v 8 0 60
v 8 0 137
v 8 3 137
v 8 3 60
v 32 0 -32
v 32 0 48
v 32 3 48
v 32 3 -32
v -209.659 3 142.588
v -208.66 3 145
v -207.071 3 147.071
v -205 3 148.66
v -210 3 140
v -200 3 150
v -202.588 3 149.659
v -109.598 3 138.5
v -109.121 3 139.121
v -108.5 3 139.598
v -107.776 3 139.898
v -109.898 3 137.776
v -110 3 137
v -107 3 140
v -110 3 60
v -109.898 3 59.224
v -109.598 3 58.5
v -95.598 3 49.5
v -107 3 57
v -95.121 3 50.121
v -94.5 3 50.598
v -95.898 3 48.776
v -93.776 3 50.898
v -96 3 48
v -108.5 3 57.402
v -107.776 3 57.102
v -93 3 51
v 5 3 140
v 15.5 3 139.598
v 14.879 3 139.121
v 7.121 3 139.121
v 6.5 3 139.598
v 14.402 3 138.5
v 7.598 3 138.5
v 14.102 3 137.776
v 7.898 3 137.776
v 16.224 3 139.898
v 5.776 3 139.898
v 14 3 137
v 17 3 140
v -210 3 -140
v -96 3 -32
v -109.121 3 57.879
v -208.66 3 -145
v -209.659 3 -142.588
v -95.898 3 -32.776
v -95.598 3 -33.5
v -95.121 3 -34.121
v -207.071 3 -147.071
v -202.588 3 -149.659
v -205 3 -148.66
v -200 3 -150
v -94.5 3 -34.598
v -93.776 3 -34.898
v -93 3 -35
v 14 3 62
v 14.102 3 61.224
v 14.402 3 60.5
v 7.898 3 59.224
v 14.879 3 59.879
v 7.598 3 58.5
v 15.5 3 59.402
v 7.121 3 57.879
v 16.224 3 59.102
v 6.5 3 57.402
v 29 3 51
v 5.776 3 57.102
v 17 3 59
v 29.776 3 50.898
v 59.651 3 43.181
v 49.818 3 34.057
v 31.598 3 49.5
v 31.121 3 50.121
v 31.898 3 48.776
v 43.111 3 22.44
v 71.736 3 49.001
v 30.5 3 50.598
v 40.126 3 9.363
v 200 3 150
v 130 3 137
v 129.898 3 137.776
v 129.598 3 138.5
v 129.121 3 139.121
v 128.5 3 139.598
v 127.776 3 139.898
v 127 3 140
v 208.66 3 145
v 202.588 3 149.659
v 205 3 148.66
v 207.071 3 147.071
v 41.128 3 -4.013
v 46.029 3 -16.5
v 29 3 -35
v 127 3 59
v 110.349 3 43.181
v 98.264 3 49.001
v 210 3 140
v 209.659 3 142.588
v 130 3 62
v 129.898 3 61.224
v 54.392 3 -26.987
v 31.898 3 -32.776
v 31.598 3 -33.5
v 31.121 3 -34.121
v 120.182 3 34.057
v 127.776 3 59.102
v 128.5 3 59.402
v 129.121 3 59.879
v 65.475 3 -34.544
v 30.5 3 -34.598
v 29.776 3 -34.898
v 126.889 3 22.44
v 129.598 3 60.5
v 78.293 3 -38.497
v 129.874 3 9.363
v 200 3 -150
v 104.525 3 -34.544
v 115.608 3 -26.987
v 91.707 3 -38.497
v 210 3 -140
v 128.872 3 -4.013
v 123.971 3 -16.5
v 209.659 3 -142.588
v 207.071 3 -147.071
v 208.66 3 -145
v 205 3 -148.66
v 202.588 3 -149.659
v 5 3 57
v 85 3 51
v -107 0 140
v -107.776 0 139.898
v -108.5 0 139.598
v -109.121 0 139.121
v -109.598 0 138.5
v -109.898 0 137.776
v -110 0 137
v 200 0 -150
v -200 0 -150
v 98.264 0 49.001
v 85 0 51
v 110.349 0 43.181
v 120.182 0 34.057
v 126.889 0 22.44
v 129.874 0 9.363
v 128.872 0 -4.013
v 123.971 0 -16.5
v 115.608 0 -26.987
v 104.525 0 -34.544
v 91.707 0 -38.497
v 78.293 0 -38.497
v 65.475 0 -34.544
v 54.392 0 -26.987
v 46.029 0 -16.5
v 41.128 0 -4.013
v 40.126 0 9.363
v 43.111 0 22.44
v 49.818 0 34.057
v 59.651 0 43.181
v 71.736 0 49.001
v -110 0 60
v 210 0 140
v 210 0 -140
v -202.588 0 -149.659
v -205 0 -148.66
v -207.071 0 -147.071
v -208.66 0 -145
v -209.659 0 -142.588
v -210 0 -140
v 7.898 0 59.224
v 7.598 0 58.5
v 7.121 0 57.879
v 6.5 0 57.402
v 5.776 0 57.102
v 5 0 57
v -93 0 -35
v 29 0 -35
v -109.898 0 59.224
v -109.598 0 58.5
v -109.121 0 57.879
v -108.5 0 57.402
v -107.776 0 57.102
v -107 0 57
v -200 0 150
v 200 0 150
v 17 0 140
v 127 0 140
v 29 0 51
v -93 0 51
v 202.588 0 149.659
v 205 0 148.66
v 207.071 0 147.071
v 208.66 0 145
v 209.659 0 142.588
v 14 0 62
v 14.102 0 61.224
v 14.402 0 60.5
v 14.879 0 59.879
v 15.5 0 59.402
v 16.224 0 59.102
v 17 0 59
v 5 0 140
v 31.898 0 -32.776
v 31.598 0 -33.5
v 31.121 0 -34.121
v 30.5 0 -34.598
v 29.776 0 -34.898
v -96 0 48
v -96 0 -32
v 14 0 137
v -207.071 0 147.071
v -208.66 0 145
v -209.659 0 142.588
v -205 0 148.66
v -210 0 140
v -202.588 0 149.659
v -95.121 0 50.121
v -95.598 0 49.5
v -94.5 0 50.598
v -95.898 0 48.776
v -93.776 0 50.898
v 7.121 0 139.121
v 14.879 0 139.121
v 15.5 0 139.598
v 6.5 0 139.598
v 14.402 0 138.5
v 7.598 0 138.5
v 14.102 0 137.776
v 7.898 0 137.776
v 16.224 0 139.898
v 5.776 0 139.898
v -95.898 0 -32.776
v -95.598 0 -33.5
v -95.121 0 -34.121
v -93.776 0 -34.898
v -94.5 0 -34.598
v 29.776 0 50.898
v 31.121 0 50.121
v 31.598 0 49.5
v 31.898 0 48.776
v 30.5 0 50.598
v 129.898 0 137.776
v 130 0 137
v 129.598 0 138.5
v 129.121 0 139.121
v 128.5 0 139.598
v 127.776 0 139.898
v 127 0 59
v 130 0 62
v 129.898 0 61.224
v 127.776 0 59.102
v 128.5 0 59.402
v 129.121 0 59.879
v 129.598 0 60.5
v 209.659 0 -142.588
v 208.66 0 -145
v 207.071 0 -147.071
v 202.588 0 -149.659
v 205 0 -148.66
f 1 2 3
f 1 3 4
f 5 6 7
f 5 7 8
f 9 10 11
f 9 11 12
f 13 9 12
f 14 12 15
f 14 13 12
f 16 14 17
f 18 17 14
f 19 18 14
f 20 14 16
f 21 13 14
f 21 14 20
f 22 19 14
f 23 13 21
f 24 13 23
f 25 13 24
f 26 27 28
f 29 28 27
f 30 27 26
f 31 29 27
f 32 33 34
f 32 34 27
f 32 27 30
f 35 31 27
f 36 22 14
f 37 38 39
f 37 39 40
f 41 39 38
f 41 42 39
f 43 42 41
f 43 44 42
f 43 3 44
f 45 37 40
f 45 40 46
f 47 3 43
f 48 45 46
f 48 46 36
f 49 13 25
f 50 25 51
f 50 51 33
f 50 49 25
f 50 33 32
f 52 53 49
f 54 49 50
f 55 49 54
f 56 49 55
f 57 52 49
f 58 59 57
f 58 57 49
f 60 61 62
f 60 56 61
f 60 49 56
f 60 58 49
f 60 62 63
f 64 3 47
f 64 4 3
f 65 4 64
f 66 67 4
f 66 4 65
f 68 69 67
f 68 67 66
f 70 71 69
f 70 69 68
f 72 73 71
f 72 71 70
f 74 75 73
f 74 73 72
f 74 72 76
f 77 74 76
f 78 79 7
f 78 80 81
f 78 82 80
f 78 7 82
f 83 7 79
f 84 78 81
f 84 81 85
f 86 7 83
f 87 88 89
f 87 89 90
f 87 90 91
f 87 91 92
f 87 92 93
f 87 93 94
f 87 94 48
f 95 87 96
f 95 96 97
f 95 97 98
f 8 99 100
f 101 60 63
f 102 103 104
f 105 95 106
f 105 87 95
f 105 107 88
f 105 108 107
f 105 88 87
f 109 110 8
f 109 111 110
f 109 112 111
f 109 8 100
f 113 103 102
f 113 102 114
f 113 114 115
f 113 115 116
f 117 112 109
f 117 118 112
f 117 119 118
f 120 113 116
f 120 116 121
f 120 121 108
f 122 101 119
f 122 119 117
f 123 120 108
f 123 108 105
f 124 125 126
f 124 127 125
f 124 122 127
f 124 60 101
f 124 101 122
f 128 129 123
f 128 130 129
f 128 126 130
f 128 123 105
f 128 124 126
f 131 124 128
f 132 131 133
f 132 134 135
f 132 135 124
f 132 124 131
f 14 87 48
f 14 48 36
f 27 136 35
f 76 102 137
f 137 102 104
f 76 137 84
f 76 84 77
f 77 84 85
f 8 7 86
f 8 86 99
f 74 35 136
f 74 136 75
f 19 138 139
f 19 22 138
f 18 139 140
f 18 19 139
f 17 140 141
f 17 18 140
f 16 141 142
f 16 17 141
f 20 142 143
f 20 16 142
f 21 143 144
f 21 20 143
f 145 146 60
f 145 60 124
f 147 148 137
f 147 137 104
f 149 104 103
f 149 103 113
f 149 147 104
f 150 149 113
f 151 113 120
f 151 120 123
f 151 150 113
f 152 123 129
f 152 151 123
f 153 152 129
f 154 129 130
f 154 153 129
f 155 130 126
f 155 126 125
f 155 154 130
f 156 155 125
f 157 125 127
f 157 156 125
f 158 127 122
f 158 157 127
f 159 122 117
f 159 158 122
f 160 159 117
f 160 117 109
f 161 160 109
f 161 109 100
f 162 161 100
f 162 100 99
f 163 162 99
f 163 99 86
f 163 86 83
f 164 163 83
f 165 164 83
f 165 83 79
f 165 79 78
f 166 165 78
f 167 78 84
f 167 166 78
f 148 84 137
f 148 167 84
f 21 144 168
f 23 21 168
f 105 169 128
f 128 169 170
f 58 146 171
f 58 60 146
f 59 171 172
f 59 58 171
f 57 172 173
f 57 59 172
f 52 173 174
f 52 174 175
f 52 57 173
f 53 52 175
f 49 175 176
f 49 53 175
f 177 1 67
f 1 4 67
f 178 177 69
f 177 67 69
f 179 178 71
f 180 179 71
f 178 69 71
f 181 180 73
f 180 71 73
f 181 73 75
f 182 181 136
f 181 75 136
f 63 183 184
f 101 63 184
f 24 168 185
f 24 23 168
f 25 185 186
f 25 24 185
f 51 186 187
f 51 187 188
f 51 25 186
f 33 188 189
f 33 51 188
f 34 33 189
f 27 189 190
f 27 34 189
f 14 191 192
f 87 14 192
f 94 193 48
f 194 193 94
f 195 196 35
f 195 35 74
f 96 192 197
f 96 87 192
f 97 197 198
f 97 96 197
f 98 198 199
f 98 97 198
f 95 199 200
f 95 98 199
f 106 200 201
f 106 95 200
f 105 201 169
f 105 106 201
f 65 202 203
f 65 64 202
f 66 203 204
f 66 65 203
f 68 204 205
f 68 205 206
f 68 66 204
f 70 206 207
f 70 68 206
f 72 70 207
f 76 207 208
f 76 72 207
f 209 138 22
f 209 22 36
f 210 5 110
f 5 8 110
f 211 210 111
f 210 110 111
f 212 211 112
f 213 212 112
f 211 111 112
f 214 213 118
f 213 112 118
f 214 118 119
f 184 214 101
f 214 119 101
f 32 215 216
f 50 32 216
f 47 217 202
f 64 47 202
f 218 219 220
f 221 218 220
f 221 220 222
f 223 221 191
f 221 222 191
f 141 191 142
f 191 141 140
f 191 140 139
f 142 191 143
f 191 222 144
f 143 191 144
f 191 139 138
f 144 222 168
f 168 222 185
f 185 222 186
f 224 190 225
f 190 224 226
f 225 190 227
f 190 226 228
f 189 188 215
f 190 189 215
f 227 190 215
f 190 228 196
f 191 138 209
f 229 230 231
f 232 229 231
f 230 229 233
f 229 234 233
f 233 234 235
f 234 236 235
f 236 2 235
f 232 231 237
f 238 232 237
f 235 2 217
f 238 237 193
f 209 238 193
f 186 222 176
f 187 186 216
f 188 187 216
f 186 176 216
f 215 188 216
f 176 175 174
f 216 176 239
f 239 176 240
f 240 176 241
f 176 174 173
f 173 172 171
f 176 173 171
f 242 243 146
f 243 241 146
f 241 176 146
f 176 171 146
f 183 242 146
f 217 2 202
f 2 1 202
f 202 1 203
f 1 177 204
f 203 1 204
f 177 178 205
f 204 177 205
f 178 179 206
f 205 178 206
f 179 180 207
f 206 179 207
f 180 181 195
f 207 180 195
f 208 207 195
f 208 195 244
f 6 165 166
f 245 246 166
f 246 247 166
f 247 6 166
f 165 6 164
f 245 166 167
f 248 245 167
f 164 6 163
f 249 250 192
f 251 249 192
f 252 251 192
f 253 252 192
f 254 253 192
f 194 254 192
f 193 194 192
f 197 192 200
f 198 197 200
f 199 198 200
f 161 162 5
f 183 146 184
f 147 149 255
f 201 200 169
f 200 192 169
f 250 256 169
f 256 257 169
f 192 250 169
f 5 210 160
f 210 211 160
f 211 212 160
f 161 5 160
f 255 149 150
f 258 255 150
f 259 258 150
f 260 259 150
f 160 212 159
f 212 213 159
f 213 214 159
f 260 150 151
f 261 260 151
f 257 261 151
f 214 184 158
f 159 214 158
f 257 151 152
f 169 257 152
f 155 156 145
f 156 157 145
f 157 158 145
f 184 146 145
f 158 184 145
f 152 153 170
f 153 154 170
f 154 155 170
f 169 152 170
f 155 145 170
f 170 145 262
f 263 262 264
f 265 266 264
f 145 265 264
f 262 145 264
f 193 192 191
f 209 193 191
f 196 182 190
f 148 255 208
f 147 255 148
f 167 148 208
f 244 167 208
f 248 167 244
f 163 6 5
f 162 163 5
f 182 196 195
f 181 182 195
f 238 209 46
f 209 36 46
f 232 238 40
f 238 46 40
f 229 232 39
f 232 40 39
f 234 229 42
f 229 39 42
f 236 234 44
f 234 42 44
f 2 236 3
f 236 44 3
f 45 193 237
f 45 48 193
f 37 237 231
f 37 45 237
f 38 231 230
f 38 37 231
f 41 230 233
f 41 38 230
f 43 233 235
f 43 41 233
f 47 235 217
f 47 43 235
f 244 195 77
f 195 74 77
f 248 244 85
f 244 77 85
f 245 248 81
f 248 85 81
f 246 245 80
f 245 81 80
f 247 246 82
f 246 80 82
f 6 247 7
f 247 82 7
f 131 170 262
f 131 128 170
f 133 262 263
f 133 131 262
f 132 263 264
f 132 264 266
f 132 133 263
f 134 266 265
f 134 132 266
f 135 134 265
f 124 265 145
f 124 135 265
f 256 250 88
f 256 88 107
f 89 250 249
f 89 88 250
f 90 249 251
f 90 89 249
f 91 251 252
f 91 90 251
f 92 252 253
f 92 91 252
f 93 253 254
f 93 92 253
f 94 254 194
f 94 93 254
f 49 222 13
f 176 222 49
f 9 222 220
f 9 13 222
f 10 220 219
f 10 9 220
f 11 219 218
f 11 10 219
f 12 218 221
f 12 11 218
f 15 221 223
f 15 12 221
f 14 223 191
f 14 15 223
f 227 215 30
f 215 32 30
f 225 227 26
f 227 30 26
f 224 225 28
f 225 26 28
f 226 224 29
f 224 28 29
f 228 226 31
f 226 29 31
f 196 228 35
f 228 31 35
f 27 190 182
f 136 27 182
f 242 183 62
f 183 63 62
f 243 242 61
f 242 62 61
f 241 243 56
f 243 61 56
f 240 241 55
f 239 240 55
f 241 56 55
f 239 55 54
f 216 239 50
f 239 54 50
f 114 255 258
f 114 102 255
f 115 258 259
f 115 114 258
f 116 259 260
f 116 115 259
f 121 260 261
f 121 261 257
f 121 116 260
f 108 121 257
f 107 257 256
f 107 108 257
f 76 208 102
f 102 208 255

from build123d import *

# Parameters (mm, degrees)
SKETCH_2_W      = 420
SKETCH_2_H      = 300
SKETCH_2_R      = 45
SKETCH_2_W_2    = 116
SKETCH_2_H_2    = 81
SKETCH_2_W_3    = 118
SKETCH_2_H_3    = 83
SKETCH_2_W_4    = 128
SKETCH_2_H_4    = 86
EXTRUDE_2_DEPTH = 3
FILLET_1_R      = 3
FILLET_2_R      = 3
FILLET_3_R      = 3
FILLET_4_R      = 3
FILLET_5_R      = 3
FILLET_6_R      = 3
FILLET_7_R      = 3
FILLET_8_R      = 3
FILLET_9_R      = 3
FILLET_10_R     = 3
FILLET_11_R     = 3
FILLET_12_R     = 3
FILLET_13_R     = 10
FILLET_14_R     = 10
FILLET_15_R     = 10
FILLET_16_R     = 10


with BuildPart() as part:
    # 草图2 → 凸台-拉伸2 (new body)
    with BuildSketch(Plane(origin=(0, 0, 0), x_dir=(1, 0, 0), z_dir=(0, 1, 0))):
        Rectangle(SKETCH_2_W, SKETCH_2_H)
        with Locations(Location((85, -6, 0), (0, 0, 270))):
            Circle(SKETCH_2_R, mode=Mode.SUBTRACT)
        with Locations((72, -99.5)):
            Rectangle(SKETCH_2_W_2, SKETCH_2_H_2, mode=Mode.SUBTRACT)
        with Locations((-51, -98.5)):
            Rectangle(SKETCH_2_W_3, SKETCH_2_H_3, mode=Mode.SUBTRACT)
        with Locations((-32, -8)):
            Rectangle(SKETCH_2_W_4, SKETCH_2_H_4, mode=Mode.SUBTRACT)
    extrude(amount=EXTRUDE_2_DEPTH)

    # 圆角1
    fillet_1_edges = [part.edges().sort_by_distance(p)[0] for p in [
        (-96, 1.5, -35),
    ]]
    fillet(fillet_1_edges, radius=FILLET_1_R)

    # 圆角2
    fillet_2_edges = [part.edges().sort_by_distance(p)[0] for p in [
        (-96, 1.5, 51),
    ]]
    fillet(fillet_2_edges, radius=FILLET_2_R)

    # 圆角3
    fillet_3_edges = [part.edges().sort_by_distance(p)[0] for p in [
        (32, 1.5, 51),
    ]]
    fillet(fillet_3_edges, radius=FILLET_3_R)

    # 圆角4
    fillet_4_edges = [part.edges().sort_by_distance(p)[0] for p in [
        (32, 1.5, -35),
    ]]
    fillet(fillet_4_edges, radius=FILLET_4_R)

    # 圆角5
    fillet_5_edges = [part.edges().sort_by_distance(p)[0] for p in [
        (14, 1.5, 140),
    ]]
    fillet(fillet_5_edges, radius=FILLET_5_R)

    # 圆角6
    fillet_6_edges = [part.edges().sort_by_distance(p)[0] for p in [
        (14, 1.5, 59),
    ]]
    fillet(fillet_6_edges, radius=FILLET_6_R)

    # 圆角7
    fillet_7_edges = [part.edges().sort_by_distance(p)[0] for p in [
        (130, 1.5, 59),
    ]]
    fillet(fillet_7_edges, radius=FILLET_7_R)

    # 圆角8
    fillet_8_edges = [part.edges().sort_by_distance(p)[0] for p in [
        (130, 1.5, 140),
    ]]
    fillet(fillet_8_edges, radius=FILLET_8_R)

    # 圆角9
    fillet_9_edges = [part.edges().sort_by_distance(p)[0] for p in [
        (8, 1.5, 140),
    ]]
    fillet(fillet_9_edges, radius=FILLET_9_R)

    # 圆角10
    fillet_10_edges = [part.edges().sort_by_distance(p)[0] for p in [
        (8, 1.5, 57),
    ]]
    fillet(fillet_10_edges, radius=FILLET_10_R)

    # 圆角11
    fillet_11_edges = [part.edges().sort_by_distance(p)[0] for p in [
        (-110, 1.5, 140),
    ]]
    fillet(fillet_11_edges, radius=FILLET_11_R)

    # 圆角12
    fillet_12_edges = [part.edges().sort_by_distance(p)[0] for p in [
        (-110, 1.5, 57),
    ]]
    fillet(fillet_12_edges, radius=FILLET_12_R)

    # 圆角13
    fillet_13_edges = [part.edges().sort_by_distance(p)[0] for p in [
        (-210, 1.5, 150),
    ]]
    fillet(fillet_13_edges, radius=FILLET_13_R)

    # 圆角14
    fillet_14_edges = [part.edges().sort_by_distance(p)[0] for p in [
        (210, 1.5, 150),
    ]]
    fillet(fillet_14_edges, radius=FILLET_14_R)

    # 圆角15
    fillet_15_edges = [part.edges().sort_by_distance(p)[0] for p in [
        (210, 1.5, -150),
    ]]
    fillet(fillet_15_edges, radius=FILLET_15_R)

    # 圆角16
    fillet_16_edges = [part.edges().sort_by_distance(p)[0] for p in [
        (-210, 1.5, -150),
    ]]
    fillet(fillet_16_edges, radius=FILLET_16_R)


solid = part.part
